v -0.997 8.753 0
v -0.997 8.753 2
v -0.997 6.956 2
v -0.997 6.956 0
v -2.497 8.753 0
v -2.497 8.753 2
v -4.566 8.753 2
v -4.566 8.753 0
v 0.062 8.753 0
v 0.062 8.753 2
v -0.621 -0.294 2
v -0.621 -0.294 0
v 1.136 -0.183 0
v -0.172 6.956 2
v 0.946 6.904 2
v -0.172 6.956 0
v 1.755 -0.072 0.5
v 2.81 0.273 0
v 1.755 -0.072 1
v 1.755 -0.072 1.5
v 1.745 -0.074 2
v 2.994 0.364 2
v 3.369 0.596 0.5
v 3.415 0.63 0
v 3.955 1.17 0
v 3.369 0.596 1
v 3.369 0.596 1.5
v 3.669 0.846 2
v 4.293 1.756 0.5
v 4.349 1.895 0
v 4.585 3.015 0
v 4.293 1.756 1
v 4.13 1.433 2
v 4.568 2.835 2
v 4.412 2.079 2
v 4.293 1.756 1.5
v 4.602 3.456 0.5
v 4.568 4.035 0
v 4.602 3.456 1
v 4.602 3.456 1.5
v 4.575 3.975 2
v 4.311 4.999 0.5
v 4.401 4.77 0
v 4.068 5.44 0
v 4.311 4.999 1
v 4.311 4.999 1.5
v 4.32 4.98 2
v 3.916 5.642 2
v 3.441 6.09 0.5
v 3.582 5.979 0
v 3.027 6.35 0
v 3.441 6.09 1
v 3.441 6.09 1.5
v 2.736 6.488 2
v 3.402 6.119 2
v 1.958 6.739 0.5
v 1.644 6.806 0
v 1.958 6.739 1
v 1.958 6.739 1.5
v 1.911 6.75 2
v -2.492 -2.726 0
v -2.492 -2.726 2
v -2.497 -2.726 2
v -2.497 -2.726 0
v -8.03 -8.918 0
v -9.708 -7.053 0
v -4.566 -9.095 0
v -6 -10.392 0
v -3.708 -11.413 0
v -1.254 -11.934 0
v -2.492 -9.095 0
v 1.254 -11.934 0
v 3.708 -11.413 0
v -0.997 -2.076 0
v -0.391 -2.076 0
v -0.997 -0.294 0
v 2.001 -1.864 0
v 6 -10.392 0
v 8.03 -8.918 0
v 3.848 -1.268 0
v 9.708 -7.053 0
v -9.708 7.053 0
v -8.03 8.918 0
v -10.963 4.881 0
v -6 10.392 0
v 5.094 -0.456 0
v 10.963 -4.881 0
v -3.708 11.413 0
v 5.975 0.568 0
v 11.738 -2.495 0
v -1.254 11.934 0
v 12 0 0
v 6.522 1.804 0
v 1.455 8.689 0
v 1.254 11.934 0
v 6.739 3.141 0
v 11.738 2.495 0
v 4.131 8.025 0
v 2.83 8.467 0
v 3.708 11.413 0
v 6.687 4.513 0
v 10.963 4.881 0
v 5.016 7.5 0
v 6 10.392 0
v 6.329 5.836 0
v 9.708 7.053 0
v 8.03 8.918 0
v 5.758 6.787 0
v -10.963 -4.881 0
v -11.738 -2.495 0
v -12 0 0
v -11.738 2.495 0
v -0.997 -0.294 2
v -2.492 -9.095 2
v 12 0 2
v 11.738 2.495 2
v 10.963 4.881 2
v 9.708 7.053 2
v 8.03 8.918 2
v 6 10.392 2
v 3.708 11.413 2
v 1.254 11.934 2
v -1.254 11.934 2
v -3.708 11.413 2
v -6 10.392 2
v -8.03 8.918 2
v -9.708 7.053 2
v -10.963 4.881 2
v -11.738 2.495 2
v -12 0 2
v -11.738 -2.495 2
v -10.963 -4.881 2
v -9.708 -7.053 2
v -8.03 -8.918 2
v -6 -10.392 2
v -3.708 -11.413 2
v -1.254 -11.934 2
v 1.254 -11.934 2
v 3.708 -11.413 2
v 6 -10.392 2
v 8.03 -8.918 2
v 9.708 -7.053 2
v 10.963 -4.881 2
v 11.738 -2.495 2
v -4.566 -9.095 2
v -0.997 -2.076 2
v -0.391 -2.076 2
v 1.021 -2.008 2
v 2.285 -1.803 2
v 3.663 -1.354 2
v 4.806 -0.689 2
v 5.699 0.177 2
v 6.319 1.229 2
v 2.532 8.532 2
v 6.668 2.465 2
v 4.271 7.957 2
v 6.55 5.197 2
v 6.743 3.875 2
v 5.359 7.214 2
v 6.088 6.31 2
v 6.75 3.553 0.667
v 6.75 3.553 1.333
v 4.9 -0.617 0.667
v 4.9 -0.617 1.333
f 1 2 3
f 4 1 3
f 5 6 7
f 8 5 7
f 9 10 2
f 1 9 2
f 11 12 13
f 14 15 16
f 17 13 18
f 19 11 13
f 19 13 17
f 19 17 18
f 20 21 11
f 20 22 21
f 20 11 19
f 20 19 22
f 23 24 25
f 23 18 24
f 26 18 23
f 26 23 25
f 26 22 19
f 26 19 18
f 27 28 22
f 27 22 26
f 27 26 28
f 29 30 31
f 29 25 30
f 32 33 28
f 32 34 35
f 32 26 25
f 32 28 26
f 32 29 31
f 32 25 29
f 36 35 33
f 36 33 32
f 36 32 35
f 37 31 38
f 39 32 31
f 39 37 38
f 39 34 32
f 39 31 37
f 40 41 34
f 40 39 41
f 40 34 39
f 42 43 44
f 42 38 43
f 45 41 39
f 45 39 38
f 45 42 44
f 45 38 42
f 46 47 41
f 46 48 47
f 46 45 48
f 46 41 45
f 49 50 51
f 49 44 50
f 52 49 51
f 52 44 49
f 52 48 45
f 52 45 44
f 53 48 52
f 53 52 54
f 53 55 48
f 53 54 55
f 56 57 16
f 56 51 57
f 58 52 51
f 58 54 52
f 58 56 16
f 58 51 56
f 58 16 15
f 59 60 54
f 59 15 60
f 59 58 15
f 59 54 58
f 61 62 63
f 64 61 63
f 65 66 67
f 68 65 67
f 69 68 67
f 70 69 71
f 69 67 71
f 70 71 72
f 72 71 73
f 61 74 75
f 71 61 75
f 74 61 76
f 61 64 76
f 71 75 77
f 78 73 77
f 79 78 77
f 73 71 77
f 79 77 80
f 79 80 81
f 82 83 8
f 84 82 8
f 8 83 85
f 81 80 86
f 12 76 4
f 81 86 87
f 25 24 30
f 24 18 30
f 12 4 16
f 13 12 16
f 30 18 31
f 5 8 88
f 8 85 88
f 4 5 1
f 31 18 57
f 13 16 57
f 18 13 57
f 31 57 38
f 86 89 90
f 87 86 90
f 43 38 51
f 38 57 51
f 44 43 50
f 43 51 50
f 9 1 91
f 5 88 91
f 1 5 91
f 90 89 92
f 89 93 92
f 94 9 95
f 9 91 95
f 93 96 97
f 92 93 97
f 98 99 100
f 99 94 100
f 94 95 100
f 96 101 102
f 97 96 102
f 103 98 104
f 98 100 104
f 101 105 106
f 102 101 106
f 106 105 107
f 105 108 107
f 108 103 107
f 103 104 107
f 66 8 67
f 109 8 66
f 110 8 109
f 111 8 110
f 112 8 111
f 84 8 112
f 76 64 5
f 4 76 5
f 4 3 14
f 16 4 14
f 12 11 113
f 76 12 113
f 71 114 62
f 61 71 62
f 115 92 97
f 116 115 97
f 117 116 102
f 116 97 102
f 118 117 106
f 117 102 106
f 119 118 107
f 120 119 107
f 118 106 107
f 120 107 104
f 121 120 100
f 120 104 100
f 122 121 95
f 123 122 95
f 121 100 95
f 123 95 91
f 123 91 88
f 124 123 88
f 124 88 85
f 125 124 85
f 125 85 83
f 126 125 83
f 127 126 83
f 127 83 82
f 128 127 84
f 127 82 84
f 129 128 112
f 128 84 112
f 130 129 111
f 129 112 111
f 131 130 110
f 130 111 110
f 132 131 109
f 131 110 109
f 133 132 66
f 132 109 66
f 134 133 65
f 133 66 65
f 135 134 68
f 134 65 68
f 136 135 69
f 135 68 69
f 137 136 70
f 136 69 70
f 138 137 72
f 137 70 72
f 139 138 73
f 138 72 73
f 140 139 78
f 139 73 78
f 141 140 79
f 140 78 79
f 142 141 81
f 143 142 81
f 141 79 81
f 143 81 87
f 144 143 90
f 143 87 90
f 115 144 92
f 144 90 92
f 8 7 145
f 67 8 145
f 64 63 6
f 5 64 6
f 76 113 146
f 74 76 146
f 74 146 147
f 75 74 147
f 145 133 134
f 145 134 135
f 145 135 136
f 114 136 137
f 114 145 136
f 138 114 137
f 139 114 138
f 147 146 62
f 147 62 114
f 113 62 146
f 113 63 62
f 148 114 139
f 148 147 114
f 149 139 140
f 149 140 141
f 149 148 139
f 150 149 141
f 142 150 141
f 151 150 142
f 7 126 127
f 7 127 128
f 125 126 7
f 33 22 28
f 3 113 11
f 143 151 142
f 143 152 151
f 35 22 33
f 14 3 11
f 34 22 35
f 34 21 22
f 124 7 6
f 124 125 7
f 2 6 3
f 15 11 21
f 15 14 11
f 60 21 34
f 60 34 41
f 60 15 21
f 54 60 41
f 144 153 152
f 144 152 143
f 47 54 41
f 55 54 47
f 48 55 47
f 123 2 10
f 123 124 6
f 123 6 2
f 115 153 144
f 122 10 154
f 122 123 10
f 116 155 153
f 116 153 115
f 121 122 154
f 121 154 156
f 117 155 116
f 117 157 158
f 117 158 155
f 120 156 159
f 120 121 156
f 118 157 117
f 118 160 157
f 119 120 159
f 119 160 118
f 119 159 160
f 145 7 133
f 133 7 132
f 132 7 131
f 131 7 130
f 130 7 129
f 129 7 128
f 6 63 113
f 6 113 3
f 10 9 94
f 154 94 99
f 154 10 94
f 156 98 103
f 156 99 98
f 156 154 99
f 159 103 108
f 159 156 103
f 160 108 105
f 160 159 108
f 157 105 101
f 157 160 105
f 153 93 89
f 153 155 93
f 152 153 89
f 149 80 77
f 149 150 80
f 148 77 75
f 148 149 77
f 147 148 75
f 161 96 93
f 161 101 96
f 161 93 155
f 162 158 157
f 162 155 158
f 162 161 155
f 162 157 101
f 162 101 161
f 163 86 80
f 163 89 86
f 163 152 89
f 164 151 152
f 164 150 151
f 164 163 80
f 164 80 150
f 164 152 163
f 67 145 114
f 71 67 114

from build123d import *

# Parameters (mm, degrees)
F0_R     = 12
F1_DEPTH = 2
F3_DEPTH = 25


with BuildPart() as f1:
    # F0 (on Top) → F1 (new body)
    with BuildSketch(Plane.XY):
        Circle(F0_R)
    extrude(amount=F1_DEPTH)

    # F2 (on face) → F3 (cut)
    with BuildSketch(Plane.XY.offset(2)):
        Polygon((-2.4922248213, -2.7263574302), (-2.4970963951, -2.7263574302), (-2.4970963951, 8.7525503095), (-4.5664435713, 8.7525503095), (-4.5664435713, -9.0951059405), (-2.4922248213, -9.0951059405), align=None)
        with BuildLine():
            Line((0.0624626787, 8.7525503095), (-0.9970963951, 8.7525503095))
            Line((-0.9970963951, 8.7525503095), (-0.9970963951, 6.9556753095))
            Line((-0.9970963951, 6.9556753095), (-0.1719123213, 6.9556753095))
            add(Edge.make_bspline(
                [(3.4413689287, 6.0904409345), (2.2812126787, 6.9556753095), (-0.1719123213, 6.9556753095)],
                knots=[0, 0, 0, 1, 1, 1], degree=2))
            add(Edge.make_bspline(
                [(4.6015251787, 3.4556753095), (4.6015251787, 5.2252065595), (3.4413689287, 6.0904409345)],
                knots=[0, 0, 0, 1, 1, 1], degree=2))
            add(Edge.make_bspline(
                [(3.3691033037, 0.5963003095), (4.6015251787, 1.4869253095), (4.6015251787, 3.4556753095)],
                knots=[0, 0, 0, 1, 1, 1], degree=2))
            add(Edge.make_bspline(
                [(-0.6211310713, -0.2943246905), (2.1366814287, -0.2943246905), (3.3691033037, 0.5963003095)],
                knots=[0, 0, 0, 1, 1, 1], degree=2))
            Line((-0.6211310713, -0.2943246905), (-0.9970963951, -0.2943246905))
            Line((-0.9970963951, -0.2943246905), (-0.9970963951, -2.0755746905))
            Line((-0.9970963951, -2.0755746905), (-0.3906623213, -2.0755746905))
            add(Edge.make_bspline(
                [(4.9003533037, -0.6165903155), (3.0507439287, -2.0755746905), (-0.3906623213, -2.0755746905)],
                knots=[0, 0, 0, 1, 1, 1], degree=2))
            add(Edge.make_bspline(
                [(6.7499626787, 3.5533315595), (6.7499626787, 0.8423940595), (4.9003533037, -0.6165903155)],
                knots=[0, 0, 0, 1, 1, 1], degree=2))
            add(Edge.make_bspline(
                [(0.0624626787, 8.7525503095), (6.7499626787, 8.7525503095), (6.7499626787, 3.5533315595)],
                knots=[0, 0, 0, 1, 1, 1], degree=2))
        make_face()
    extrude(amount=-F3_DEPTH, mode=Mode.SUBTRACT)


solid = f1.part
